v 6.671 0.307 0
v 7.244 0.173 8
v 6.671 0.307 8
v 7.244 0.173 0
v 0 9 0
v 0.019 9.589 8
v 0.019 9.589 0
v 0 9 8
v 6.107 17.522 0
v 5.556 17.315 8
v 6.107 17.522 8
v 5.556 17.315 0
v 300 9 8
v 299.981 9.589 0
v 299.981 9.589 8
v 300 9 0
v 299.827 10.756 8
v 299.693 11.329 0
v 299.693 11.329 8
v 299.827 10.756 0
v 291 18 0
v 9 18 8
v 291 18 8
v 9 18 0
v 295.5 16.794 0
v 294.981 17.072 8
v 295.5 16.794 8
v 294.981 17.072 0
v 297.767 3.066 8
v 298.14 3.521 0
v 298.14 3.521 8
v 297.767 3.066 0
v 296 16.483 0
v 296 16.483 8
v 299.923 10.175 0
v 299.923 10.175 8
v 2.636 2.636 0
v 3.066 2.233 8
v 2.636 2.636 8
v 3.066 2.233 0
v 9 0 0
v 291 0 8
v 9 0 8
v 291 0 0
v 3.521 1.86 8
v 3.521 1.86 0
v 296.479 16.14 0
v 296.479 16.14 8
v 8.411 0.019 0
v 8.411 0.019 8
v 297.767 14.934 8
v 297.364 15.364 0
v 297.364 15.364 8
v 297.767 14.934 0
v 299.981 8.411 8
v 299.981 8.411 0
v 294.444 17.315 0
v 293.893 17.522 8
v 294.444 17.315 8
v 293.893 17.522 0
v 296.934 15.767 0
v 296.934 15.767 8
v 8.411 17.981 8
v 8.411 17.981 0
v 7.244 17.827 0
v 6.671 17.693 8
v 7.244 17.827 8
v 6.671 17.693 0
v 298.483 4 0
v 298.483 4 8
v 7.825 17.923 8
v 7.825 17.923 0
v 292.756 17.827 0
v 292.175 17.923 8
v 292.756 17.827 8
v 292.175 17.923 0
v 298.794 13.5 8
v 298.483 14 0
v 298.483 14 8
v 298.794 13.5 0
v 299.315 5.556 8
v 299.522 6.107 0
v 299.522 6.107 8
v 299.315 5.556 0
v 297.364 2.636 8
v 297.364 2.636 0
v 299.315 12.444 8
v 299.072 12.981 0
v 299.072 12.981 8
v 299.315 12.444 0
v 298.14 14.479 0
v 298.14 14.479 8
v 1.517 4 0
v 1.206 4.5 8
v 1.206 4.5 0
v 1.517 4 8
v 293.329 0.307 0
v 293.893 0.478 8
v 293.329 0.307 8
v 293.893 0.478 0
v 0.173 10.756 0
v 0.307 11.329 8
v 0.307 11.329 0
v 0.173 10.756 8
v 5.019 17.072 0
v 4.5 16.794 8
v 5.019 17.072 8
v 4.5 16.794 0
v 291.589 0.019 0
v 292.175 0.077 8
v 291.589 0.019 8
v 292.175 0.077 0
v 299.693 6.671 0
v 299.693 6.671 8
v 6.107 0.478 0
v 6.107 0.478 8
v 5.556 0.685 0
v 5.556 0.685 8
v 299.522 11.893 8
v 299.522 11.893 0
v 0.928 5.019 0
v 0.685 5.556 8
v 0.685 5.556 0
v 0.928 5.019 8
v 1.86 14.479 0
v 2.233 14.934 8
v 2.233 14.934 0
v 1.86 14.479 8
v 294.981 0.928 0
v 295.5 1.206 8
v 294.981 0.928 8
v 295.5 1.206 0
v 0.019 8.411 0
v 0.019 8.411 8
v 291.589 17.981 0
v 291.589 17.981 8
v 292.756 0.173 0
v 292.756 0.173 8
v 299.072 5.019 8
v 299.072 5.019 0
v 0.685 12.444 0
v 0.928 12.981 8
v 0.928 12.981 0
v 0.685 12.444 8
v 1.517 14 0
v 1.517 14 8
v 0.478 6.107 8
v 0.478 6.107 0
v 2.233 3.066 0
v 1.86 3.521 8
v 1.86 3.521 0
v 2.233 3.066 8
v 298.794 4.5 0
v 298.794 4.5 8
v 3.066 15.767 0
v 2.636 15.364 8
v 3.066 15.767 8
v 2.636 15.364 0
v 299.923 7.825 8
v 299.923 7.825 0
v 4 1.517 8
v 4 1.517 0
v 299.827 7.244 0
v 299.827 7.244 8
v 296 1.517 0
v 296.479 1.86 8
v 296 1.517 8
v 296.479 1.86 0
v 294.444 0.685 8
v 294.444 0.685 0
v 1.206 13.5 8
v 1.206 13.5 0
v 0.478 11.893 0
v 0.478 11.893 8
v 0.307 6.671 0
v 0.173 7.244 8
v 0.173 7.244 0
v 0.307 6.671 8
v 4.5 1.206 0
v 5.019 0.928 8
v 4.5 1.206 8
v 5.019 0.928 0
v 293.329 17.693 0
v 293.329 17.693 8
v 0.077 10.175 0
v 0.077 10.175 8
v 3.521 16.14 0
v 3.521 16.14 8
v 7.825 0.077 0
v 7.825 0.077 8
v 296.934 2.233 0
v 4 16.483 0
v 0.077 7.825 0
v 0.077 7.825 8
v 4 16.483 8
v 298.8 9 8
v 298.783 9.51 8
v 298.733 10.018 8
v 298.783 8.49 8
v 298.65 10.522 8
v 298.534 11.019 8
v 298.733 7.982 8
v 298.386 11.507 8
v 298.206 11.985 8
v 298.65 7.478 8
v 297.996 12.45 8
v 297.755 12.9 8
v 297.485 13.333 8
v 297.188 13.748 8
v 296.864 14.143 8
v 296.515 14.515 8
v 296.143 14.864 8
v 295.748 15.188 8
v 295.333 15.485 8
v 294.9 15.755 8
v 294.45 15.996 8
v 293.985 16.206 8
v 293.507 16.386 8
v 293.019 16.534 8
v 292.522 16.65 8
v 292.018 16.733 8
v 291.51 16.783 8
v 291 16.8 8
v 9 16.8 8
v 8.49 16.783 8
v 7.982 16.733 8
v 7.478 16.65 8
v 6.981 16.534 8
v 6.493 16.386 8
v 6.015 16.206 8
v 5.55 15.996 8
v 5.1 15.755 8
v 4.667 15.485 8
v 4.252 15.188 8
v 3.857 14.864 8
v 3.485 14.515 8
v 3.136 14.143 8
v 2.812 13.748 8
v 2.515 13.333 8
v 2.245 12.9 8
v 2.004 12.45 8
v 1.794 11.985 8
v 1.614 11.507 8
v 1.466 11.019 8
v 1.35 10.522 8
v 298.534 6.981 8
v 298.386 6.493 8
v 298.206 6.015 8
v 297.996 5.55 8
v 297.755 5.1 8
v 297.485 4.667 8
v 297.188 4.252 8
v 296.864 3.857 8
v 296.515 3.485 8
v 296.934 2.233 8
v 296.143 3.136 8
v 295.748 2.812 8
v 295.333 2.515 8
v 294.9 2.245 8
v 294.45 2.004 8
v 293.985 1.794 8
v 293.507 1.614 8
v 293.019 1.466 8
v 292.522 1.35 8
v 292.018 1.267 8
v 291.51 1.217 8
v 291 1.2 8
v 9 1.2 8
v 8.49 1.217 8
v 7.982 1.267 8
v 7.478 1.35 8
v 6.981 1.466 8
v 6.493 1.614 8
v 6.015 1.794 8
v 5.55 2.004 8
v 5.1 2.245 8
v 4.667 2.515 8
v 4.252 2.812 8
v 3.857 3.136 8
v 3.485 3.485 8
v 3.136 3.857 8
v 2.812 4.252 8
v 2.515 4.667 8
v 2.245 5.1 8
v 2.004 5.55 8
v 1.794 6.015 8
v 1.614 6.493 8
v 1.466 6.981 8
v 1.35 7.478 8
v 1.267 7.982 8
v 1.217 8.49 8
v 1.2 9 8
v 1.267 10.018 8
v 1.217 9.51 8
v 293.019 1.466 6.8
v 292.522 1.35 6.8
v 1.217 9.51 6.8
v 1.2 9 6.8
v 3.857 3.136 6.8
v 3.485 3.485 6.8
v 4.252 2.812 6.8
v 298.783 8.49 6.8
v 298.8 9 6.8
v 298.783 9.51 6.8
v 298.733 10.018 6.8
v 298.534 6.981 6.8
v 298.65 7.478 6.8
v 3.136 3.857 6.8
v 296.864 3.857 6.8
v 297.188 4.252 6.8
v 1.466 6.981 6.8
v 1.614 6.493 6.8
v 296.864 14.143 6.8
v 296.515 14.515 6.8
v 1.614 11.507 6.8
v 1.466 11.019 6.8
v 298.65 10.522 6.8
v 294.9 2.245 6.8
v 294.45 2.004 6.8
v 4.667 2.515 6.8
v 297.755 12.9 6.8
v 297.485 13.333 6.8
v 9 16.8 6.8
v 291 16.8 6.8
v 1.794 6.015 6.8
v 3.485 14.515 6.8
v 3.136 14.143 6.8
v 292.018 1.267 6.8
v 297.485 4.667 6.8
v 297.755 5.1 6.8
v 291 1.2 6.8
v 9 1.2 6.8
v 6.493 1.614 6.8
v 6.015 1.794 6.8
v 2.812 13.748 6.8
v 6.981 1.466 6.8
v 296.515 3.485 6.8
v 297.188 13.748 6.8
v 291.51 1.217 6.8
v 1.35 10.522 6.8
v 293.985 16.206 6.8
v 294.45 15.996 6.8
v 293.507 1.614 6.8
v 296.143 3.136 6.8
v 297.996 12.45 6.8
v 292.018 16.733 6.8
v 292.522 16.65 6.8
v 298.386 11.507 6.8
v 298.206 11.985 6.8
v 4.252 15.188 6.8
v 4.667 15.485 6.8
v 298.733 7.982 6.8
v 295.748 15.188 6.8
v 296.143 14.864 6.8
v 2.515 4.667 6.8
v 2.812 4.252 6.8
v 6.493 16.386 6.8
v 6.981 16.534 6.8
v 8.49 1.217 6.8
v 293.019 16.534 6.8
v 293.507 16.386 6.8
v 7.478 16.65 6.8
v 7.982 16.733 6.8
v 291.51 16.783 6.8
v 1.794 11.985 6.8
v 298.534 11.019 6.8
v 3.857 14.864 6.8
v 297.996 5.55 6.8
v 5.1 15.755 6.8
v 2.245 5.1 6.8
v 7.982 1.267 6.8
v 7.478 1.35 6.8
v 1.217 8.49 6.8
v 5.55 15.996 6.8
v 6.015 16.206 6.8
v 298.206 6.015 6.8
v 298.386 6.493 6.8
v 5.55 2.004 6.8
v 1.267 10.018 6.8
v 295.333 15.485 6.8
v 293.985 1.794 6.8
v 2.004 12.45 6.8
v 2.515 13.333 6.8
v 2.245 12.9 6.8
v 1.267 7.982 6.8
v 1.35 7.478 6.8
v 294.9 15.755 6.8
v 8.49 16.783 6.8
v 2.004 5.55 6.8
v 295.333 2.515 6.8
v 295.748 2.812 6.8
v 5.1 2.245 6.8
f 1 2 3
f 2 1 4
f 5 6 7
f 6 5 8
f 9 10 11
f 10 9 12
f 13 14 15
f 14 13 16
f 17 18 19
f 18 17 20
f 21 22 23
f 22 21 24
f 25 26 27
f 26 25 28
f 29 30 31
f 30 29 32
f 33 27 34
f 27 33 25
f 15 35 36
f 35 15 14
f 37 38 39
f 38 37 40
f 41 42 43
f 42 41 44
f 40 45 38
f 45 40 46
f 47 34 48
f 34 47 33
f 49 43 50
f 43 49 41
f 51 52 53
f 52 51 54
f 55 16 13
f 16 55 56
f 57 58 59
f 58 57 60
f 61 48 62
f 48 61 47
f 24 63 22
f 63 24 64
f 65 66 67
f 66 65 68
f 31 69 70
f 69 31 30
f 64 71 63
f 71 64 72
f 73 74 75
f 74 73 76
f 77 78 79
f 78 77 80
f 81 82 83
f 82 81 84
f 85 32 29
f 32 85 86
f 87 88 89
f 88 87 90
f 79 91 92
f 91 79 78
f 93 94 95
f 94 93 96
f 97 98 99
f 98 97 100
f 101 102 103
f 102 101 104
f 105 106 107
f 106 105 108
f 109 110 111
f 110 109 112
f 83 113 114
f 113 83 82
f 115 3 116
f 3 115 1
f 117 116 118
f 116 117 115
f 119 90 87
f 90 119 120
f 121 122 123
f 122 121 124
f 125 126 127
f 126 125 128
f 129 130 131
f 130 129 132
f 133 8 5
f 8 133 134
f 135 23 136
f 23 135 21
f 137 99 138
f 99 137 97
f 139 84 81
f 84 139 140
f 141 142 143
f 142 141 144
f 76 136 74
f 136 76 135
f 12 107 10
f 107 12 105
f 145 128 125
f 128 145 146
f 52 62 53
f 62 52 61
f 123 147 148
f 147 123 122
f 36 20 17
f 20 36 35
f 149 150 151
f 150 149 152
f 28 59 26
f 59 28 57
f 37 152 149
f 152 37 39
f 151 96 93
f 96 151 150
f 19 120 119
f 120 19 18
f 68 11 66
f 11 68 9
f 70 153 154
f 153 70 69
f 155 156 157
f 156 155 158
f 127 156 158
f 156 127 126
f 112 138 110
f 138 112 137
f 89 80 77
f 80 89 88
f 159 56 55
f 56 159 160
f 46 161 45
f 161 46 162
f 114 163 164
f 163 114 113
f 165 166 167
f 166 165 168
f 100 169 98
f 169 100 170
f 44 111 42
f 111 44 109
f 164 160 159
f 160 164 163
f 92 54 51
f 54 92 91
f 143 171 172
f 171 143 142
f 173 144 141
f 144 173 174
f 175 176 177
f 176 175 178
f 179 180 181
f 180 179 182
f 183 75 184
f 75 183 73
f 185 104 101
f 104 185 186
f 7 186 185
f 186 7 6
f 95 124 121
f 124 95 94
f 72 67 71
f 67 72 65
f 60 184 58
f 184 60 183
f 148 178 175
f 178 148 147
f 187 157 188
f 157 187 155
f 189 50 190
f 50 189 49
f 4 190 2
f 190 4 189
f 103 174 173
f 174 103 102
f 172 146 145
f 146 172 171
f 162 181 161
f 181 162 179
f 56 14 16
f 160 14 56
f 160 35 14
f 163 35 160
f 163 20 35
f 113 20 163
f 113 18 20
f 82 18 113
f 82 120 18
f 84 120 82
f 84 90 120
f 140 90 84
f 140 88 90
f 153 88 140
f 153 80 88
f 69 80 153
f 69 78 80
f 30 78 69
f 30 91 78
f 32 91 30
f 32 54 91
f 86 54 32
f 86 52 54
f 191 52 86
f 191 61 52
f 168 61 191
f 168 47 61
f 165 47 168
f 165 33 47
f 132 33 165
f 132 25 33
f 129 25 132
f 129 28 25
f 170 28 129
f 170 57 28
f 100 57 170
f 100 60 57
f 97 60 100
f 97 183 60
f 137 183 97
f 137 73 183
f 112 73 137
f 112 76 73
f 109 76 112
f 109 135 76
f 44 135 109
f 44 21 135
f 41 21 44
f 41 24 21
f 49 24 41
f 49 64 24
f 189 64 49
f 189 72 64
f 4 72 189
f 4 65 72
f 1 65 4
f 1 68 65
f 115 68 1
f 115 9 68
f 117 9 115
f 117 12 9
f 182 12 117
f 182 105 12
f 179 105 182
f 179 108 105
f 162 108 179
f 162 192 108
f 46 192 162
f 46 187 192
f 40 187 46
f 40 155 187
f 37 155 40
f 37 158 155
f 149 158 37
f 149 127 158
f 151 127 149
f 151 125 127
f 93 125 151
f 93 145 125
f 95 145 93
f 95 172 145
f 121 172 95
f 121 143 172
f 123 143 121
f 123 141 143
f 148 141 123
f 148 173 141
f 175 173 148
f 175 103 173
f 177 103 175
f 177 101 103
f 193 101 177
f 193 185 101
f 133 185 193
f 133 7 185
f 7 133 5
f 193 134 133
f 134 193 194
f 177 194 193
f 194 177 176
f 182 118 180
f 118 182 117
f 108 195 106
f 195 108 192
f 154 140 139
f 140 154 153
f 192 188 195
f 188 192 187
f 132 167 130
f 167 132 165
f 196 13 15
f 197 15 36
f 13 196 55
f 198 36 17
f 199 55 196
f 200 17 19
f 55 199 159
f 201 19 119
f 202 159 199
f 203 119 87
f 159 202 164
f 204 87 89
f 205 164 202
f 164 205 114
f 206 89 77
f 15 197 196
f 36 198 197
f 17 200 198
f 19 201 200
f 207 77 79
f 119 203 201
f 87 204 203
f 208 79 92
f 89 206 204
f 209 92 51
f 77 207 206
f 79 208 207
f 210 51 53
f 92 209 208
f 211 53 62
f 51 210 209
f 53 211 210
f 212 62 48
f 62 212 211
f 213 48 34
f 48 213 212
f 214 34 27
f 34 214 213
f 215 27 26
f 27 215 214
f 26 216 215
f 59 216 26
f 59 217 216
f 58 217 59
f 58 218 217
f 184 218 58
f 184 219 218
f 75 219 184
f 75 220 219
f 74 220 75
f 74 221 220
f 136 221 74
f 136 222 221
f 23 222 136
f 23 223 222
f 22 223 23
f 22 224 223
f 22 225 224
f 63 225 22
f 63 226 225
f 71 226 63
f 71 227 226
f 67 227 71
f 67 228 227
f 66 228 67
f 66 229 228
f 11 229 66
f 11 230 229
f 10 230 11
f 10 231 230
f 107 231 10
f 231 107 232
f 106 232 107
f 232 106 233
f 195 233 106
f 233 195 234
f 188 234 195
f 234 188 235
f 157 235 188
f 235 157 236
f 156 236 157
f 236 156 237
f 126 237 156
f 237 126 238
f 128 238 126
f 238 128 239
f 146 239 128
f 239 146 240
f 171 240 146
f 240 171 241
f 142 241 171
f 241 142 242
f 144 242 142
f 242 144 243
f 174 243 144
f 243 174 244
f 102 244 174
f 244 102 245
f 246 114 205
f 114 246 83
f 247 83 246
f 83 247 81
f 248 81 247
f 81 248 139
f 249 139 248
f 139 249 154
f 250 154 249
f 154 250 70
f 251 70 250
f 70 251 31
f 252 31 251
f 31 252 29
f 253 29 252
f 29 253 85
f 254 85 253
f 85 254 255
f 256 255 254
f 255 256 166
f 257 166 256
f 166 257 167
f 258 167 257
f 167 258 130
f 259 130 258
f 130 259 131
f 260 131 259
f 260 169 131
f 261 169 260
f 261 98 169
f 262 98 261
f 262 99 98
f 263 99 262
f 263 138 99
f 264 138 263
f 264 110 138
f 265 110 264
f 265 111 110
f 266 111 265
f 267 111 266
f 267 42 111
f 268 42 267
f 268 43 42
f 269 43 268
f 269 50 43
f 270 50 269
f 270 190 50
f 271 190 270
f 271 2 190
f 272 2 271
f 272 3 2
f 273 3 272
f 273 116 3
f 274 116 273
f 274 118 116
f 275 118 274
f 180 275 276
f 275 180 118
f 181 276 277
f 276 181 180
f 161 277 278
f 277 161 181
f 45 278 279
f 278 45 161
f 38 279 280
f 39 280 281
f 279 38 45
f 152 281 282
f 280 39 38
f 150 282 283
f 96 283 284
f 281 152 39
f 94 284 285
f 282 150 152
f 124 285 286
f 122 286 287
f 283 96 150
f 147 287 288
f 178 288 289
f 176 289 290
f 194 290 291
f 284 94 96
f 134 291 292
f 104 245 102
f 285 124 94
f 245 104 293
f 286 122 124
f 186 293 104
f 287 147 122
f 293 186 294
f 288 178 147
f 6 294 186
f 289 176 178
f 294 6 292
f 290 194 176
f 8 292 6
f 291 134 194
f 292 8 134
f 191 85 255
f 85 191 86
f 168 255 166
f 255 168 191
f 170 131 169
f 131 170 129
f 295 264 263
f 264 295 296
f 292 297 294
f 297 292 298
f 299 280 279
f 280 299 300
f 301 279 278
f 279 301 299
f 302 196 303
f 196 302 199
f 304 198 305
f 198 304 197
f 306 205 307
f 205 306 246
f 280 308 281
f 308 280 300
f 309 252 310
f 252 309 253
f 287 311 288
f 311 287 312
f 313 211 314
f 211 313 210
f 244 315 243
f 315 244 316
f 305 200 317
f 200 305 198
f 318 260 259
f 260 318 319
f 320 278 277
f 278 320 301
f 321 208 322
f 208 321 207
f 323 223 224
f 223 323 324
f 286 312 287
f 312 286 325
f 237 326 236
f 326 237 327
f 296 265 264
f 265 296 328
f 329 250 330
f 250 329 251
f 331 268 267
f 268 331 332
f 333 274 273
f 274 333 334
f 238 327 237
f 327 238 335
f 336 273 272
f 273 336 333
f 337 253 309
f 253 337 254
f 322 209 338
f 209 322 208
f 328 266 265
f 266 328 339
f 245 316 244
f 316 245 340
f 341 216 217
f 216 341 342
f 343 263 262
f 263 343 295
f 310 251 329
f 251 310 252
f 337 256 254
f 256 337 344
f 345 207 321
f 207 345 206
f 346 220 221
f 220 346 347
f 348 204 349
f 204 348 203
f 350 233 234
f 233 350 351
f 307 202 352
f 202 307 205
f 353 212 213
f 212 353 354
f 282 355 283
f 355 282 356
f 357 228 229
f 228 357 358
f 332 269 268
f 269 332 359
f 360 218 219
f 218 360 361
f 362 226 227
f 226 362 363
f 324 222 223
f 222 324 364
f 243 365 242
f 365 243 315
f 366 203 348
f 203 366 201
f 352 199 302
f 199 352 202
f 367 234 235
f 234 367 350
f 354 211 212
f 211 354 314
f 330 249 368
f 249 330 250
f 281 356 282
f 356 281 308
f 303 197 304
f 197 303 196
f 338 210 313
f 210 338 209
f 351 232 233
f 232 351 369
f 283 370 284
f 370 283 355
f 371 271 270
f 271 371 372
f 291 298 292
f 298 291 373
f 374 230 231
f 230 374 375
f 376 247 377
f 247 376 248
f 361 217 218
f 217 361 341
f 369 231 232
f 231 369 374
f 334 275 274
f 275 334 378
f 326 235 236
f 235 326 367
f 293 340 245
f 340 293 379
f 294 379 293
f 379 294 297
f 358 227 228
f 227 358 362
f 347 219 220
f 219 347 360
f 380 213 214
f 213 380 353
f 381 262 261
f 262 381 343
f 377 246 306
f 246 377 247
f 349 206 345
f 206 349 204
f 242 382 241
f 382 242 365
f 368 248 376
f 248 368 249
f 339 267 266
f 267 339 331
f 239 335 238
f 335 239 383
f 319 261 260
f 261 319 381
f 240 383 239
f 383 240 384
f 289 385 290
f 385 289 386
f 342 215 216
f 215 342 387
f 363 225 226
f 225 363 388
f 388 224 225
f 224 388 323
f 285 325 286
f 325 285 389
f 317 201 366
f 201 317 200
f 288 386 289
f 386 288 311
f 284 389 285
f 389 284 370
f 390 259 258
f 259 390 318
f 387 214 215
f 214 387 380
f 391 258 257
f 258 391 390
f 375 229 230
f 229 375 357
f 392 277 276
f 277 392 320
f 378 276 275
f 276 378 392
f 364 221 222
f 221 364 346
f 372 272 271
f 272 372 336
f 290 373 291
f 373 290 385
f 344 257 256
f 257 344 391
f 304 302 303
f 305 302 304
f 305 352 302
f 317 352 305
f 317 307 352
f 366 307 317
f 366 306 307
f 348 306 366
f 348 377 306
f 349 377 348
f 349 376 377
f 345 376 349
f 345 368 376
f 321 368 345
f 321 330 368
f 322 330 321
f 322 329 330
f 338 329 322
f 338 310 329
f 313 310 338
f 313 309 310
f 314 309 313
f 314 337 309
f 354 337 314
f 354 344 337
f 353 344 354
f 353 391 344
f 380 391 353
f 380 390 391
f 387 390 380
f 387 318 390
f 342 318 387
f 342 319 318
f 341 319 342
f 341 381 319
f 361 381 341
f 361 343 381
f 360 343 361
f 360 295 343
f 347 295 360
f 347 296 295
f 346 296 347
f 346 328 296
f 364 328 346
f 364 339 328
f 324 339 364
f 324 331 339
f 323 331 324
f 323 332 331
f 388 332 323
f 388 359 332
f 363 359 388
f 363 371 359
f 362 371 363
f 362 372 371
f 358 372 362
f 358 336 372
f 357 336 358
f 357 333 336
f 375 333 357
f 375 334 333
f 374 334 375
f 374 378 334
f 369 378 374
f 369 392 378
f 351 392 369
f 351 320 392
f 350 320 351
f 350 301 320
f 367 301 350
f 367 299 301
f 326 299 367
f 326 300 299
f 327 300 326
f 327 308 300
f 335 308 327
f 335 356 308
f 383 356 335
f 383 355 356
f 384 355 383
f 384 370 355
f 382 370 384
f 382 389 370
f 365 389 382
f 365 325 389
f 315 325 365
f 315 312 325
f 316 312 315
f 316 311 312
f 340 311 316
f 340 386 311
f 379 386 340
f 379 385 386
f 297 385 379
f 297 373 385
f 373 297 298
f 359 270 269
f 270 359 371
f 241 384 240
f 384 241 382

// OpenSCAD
$fn = 96;

// Light strip: rigid (simple rigid bar with rounded ends and a shallow diffuser recess)

length = 300;
width  = 18;
height = 8;

end_radius = width/2;

diffuser_margin = 1.2;
diffuser_depth  = 1.2;

module rounded_bar(L, W, H) {
    r = W/2;
    linear_extrude(height=H)
        hull() {
            translate([r, r]) circle(r=r);
            translate([L - r, r]) circle(r=r);
        }
}

difference() {
    // Main rigid body
    rounded_bar(length, width, height);

    // Shallow top recess for diffuser
    translate([diffuser_margin, diffuser_margin, height - diffuser_depth])
        rounded_bar(length - 2*diffuser_margin, width - 2*diffuser_margin, diffuser_depth + 0.01);
}
